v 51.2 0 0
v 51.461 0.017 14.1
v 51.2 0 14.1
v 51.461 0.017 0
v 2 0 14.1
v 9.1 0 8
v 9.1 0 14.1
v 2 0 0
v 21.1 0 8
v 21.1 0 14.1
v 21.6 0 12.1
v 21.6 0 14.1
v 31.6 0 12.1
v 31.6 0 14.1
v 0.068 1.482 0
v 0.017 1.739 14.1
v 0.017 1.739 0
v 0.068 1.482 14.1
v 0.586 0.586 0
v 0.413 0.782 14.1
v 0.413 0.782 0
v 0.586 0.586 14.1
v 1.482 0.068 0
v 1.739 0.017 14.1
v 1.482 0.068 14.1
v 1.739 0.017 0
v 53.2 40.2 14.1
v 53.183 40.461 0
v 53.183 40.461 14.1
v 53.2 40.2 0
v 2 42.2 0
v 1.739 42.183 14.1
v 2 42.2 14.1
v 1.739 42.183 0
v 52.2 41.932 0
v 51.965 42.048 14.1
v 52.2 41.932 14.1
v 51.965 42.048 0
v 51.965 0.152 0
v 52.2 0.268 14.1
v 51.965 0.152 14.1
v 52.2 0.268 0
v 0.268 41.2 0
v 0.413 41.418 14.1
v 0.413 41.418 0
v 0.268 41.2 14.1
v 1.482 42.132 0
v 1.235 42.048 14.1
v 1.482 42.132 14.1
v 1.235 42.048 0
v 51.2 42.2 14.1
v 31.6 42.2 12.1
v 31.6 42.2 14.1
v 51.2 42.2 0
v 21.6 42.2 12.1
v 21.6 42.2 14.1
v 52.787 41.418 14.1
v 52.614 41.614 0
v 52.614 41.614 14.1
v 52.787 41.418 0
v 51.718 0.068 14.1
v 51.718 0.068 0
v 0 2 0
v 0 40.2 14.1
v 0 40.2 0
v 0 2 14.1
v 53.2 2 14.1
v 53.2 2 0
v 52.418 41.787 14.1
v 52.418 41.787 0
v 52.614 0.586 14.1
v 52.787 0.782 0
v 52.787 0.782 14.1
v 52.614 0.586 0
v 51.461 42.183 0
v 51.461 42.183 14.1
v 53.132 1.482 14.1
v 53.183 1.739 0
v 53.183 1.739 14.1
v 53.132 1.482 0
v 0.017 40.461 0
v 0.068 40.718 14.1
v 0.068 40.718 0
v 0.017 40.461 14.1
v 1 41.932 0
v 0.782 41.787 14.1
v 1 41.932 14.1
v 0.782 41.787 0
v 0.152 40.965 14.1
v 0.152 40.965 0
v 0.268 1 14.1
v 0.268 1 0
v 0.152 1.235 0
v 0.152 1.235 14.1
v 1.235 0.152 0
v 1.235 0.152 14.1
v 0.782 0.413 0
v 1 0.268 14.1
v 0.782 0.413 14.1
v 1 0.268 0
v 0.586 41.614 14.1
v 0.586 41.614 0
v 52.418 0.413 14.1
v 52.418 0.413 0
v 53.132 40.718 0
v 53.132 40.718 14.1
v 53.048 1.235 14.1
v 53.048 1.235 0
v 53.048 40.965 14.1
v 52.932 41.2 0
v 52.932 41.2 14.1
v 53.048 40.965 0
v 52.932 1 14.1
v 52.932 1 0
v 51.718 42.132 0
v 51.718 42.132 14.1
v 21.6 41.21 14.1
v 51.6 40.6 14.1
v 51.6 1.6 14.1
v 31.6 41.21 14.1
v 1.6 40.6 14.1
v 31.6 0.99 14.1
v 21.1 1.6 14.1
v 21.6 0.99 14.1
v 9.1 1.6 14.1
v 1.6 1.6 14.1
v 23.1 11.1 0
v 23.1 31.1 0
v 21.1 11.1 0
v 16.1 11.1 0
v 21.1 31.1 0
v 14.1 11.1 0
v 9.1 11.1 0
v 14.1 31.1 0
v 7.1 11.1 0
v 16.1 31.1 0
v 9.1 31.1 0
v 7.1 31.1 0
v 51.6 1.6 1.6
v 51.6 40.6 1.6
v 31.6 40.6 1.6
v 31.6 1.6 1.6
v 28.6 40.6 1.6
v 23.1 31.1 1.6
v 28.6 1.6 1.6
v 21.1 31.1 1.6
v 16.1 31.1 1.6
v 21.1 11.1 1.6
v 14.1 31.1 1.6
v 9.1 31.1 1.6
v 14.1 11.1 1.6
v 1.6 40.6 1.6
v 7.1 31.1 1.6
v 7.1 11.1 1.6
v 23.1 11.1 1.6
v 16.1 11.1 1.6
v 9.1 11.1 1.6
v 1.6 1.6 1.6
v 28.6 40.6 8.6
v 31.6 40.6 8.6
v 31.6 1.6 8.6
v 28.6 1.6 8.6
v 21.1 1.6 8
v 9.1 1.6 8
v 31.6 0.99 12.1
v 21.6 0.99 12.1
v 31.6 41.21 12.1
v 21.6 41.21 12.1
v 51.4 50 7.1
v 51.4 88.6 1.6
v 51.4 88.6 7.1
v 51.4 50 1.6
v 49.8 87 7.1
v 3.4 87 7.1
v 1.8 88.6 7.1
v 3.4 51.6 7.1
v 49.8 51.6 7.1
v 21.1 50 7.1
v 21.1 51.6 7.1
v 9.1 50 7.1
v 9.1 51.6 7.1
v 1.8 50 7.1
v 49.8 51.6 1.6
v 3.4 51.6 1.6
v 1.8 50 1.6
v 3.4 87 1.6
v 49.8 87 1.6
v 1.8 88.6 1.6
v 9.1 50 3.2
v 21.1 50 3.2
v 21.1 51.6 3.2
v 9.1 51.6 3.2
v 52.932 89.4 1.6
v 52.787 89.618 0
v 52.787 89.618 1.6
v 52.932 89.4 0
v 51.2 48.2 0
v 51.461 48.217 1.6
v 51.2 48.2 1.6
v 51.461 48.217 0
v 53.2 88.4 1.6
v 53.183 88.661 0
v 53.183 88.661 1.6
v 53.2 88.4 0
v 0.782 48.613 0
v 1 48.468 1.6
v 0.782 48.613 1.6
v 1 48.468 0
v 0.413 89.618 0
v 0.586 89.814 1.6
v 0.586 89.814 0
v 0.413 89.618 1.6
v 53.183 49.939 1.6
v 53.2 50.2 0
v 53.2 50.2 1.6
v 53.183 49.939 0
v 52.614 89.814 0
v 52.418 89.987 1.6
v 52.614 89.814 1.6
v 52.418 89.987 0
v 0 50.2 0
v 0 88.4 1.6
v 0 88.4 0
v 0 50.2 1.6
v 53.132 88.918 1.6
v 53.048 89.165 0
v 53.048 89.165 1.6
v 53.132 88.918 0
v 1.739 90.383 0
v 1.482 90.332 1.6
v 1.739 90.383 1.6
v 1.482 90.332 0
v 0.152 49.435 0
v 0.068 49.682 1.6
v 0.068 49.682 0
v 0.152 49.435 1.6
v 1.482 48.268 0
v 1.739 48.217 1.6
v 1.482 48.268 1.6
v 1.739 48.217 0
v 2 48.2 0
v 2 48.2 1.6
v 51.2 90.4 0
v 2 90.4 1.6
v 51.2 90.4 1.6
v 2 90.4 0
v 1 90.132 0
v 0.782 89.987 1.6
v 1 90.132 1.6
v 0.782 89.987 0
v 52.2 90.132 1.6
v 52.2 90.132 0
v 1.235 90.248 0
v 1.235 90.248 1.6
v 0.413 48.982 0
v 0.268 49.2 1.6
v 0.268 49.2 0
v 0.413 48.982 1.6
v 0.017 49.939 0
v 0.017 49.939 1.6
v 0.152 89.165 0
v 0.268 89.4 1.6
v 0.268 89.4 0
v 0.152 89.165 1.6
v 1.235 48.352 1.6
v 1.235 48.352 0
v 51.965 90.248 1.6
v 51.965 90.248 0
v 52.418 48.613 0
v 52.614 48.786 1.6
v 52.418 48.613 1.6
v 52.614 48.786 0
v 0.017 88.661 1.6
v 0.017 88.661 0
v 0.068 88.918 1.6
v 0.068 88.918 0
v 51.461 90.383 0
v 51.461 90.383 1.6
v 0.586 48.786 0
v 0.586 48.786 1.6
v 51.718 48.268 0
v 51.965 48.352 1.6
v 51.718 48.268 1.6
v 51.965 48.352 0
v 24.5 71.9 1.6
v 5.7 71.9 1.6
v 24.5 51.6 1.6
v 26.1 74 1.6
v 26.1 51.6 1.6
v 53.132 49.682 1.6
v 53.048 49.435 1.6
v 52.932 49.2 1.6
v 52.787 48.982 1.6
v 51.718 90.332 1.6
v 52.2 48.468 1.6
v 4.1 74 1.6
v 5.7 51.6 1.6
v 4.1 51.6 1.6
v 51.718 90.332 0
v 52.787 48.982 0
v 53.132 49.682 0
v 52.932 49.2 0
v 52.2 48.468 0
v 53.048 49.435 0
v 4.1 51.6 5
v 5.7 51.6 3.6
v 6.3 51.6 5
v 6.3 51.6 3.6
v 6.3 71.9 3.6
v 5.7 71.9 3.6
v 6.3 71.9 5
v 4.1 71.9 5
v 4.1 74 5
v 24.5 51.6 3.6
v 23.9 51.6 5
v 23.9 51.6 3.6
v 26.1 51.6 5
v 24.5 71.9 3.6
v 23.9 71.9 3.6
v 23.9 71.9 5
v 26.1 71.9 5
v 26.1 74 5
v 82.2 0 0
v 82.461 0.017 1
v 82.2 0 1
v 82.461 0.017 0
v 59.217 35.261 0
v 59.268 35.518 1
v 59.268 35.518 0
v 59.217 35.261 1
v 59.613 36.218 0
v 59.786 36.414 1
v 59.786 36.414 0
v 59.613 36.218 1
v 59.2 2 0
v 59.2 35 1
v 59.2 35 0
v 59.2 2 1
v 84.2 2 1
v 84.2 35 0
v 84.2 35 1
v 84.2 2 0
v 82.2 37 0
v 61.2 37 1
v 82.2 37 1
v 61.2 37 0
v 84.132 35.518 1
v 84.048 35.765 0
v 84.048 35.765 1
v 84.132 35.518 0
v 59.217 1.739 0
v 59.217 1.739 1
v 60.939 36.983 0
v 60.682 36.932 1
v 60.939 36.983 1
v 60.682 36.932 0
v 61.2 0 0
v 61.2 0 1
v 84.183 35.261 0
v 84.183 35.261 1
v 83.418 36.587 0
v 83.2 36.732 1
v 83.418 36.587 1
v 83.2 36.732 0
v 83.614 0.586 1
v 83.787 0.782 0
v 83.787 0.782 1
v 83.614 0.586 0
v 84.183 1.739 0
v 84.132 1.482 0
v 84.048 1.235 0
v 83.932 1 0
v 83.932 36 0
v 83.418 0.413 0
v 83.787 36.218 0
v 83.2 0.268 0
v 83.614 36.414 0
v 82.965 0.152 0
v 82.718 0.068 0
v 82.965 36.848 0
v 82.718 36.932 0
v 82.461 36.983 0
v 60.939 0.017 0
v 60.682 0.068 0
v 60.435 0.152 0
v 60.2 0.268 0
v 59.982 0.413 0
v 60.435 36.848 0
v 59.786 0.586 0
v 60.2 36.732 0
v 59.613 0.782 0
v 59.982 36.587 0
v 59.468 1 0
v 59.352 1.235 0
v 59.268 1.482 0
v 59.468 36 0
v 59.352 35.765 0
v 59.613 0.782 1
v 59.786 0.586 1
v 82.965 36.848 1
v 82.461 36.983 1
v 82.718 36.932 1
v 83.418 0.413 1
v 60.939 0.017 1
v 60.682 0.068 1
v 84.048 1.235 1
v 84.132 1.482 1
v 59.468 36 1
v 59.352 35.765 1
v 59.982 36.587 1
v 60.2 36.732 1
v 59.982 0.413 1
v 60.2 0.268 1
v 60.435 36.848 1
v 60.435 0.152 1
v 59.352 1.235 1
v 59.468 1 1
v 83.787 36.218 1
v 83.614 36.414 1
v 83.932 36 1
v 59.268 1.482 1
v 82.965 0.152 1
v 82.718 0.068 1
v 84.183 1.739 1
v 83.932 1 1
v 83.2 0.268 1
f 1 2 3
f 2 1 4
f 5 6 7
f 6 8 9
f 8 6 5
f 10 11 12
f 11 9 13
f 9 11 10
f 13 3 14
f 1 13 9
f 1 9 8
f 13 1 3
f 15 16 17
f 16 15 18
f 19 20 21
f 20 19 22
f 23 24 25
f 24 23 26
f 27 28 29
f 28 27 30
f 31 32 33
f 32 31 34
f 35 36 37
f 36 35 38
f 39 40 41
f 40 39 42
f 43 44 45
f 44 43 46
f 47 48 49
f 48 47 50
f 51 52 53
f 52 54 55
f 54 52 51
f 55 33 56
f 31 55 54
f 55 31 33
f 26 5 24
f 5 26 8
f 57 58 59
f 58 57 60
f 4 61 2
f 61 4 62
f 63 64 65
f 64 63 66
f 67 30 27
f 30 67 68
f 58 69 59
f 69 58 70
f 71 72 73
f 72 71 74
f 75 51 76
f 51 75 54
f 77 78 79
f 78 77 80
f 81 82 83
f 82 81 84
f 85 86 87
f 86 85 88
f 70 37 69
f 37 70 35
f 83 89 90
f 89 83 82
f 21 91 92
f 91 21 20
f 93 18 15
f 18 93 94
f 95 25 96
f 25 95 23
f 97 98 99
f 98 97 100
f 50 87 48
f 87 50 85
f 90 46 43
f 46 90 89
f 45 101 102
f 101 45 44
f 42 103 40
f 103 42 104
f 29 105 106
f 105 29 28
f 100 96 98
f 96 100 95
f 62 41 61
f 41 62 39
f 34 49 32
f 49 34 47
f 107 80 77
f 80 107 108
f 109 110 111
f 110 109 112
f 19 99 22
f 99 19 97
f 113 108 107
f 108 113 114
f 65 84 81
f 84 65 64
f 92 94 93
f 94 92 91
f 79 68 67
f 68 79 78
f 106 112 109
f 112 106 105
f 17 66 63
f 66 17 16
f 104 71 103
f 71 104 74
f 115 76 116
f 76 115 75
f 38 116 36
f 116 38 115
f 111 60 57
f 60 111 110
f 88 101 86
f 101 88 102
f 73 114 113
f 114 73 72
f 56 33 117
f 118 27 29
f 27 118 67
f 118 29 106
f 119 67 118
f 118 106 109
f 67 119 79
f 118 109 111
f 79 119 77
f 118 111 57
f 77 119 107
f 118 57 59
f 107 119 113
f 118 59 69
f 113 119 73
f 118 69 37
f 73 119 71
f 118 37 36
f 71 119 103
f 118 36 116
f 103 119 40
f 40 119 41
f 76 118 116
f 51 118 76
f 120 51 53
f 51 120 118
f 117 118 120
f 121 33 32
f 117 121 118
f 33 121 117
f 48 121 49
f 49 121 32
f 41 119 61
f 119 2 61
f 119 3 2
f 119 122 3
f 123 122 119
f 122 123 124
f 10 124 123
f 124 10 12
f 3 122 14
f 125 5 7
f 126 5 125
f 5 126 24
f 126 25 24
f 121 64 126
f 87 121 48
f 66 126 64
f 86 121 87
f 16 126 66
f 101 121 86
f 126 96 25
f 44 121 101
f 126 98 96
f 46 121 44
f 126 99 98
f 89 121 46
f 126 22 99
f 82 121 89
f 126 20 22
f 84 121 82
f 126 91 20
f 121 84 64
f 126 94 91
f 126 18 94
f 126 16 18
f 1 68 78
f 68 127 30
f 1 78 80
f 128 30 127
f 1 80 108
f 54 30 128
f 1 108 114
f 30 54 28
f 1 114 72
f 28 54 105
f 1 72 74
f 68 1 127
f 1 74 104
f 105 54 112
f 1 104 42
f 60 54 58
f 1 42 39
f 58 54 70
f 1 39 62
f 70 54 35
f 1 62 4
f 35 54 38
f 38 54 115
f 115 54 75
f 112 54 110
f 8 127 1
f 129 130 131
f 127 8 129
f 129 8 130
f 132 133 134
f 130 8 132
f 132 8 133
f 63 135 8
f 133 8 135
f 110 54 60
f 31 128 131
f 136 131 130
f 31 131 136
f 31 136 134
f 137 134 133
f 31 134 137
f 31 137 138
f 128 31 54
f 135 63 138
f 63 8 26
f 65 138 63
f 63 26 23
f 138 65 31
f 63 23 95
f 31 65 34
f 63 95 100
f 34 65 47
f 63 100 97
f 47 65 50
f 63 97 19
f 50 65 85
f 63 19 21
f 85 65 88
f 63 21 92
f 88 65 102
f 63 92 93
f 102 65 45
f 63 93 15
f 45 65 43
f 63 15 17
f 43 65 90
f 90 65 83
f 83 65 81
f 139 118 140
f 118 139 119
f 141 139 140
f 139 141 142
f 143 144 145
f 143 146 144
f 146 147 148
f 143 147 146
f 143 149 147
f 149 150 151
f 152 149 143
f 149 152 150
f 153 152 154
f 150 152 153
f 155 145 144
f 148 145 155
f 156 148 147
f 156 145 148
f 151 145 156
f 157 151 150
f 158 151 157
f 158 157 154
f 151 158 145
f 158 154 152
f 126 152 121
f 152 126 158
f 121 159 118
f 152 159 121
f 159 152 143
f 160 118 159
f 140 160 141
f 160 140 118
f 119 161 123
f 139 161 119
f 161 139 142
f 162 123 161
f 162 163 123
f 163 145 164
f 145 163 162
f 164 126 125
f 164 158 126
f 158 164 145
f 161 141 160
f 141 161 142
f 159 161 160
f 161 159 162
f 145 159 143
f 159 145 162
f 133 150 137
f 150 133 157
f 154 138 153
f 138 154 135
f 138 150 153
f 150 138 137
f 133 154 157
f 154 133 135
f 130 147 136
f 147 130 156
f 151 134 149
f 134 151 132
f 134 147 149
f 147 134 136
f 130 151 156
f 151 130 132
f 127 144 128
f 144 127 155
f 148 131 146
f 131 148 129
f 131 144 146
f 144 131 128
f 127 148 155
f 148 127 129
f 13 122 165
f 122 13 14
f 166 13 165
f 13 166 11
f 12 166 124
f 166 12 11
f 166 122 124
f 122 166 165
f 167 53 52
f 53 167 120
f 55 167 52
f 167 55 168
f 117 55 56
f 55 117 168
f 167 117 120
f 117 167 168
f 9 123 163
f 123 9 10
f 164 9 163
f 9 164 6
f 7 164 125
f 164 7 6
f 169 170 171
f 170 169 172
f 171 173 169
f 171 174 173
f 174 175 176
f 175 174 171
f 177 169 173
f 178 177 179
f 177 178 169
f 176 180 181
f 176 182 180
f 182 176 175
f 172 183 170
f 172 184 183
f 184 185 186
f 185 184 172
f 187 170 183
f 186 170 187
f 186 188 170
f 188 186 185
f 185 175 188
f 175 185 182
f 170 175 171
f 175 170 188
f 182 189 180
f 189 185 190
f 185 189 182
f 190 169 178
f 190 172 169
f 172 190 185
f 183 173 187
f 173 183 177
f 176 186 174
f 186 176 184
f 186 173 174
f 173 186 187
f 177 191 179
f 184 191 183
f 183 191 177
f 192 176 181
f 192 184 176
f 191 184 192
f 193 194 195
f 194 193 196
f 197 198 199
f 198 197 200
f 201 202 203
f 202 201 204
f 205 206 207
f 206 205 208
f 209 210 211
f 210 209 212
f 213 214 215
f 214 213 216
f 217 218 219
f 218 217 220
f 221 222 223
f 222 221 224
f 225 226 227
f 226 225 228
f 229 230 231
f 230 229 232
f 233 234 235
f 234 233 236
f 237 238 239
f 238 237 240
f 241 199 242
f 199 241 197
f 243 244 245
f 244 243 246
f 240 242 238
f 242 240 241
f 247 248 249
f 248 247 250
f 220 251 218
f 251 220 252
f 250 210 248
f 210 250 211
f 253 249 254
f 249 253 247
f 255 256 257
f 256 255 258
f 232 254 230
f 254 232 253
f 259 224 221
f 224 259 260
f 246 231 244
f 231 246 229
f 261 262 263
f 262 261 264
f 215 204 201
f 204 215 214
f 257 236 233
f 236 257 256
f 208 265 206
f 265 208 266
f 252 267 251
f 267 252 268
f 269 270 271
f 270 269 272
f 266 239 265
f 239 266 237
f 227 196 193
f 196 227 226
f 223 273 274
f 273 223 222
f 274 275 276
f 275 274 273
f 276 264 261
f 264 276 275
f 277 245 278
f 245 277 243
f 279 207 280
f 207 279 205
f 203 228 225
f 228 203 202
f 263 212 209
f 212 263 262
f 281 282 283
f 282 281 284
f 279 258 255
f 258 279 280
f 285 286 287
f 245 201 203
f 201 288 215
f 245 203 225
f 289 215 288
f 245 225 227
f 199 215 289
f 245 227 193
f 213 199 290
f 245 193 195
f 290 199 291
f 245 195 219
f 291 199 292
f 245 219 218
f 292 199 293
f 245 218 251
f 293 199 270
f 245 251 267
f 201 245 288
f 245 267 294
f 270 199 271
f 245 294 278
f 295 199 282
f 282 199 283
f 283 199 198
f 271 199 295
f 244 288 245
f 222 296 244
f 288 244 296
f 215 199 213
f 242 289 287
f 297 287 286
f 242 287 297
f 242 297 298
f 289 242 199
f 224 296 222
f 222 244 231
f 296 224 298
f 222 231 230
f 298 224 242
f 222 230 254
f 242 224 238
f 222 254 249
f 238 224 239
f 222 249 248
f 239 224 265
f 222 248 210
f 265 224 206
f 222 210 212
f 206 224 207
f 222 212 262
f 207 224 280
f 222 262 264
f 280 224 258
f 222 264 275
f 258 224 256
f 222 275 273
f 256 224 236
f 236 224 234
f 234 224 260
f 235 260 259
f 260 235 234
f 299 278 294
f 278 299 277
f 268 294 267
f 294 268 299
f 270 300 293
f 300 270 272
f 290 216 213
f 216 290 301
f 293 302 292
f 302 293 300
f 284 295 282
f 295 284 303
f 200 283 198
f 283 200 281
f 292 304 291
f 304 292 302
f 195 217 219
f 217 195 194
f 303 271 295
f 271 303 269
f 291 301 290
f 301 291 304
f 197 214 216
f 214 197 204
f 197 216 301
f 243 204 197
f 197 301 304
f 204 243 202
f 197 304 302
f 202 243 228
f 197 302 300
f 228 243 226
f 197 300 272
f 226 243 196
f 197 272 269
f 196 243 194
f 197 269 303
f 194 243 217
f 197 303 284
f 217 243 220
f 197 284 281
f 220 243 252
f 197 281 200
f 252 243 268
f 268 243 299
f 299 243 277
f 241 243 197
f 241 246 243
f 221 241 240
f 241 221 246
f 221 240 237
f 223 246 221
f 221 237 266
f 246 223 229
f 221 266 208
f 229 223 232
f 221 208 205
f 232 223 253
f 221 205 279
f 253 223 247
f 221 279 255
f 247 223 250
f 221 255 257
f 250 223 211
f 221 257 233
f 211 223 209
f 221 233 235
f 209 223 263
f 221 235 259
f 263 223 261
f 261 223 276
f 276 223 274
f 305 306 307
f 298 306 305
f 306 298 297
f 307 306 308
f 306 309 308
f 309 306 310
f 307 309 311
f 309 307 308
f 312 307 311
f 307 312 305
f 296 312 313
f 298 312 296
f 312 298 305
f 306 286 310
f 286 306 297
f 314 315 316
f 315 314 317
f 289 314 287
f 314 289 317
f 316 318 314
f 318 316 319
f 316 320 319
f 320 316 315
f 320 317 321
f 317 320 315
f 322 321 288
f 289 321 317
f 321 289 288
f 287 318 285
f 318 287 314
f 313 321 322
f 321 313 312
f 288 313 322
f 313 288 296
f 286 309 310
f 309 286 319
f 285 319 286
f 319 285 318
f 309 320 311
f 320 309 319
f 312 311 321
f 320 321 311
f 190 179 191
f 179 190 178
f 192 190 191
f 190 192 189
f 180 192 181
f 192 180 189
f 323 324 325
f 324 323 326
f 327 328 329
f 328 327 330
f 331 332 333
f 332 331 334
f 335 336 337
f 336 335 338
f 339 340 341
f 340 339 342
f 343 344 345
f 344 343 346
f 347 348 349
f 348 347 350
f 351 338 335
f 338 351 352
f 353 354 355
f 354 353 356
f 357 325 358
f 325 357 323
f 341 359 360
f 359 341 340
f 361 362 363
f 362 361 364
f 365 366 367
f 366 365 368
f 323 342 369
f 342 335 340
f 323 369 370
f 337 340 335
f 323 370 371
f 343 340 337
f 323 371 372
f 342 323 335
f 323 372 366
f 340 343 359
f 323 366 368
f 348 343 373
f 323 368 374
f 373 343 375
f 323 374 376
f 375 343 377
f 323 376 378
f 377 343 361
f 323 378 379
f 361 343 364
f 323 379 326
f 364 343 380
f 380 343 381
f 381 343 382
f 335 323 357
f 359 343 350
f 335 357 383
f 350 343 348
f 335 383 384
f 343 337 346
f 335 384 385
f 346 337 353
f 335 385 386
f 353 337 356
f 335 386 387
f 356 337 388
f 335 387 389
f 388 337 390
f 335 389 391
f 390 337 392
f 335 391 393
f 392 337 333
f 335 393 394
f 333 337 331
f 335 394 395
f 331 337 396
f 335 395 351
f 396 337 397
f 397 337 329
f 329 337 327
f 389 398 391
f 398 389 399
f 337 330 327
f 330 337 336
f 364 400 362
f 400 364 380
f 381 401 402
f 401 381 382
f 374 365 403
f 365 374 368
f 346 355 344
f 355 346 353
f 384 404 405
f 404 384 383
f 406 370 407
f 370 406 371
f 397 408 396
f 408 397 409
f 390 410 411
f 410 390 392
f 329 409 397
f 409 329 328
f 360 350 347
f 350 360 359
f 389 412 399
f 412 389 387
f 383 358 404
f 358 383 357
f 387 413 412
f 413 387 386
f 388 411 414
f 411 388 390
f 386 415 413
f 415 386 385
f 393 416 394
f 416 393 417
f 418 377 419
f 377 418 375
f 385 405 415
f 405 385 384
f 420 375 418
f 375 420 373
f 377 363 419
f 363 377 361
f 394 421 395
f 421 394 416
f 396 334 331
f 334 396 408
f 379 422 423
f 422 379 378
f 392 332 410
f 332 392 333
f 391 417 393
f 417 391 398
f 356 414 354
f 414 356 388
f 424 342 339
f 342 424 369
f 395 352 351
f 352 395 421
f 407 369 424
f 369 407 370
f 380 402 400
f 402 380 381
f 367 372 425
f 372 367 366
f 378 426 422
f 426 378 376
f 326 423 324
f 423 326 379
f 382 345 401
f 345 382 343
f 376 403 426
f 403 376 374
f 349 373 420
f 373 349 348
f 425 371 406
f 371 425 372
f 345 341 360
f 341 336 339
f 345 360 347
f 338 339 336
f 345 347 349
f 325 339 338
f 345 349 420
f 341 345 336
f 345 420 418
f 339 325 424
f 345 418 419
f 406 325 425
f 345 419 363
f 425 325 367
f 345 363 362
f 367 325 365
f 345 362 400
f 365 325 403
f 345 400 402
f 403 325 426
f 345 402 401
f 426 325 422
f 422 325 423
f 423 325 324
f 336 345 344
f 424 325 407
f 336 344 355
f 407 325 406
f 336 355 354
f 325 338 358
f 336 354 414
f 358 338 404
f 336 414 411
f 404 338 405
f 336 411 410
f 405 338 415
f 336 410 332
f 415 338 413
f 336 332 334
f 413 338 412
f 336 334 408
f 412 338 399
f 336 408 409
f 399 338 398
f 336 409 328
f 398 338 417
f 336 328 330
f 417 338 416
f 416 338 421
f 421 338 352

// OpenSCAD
// =====================================================================
// XIAO ESP32S3 + 602535 LiPo + 37 x 18 FPC antenna enclosure
// Layout A: battery and antenna in separate floor bays, board on the lid
// Units: mm.  OpenSCAD 2021.01 or later.
// =====================================================================

/* [Part selection] */
part = "all";   // base | lid | pad | all

/* [Battery - 602535 pouch cell] */
bat_x = 25;
bat_y = 37;
bat_z = 6;
bat_swell = 1.0;   // pouch swelling headroom - do not remove

/* [Antenna - flat FPC] */
ant_x = 18;
ant_y = 37;

/* [Board - Seeed XIAO ESP32S3] */
pcb_x = 18;
pcb_y = 20;
pcb_t = 1.2;
pcb_fit = 0.4;     // per-side slip fit
pcb_seat = 0.8;    // standoff under the PCB
usbc_h = 3.2;      // connector shell height above the PCB

/* [Case] */
wall = 1.6;
floor_t = 1.6;
lid_t = 1.6;
rib = 3.0;
clr = 1.0;
corner_r = 2.0;
skirt_h = 5.5;
skirt_w = 1.6;
skirt_gap = 0.2;

/* [Openings] */
usb_w = 12;
vent_w = 2;
vent_l = 20;
pry_w = 10;
pry_d = 1.0;

/* [Hidden] */
$fn = 48;
eps = 0.01;

// ---------- derived ----------
bat_bay_x = bat_x + 2*clr;              // 27
bat_bay_z = bat_z + bat_swell;          // 7
ant_bay_x = ant_x + 2*clr;              // 20
inner_x   = bat_bay_x + rib + ant_bay_x;        // 50
inner_y   = max(bat_y, ant_y) + 2*clr;          // 39
inner_z   = bat_bay_z + skirt_h;                // 12.5  (bay + skirt landing)
ext_x     = inner_x + 2*wall;
ext_y     = inner_y + 2*wall;
base_h    = floor_t + inner_z;                  // 14.1
total_h   = base_h + lid_t;                     // 15.7

bat_cx    = wall + bat_bay_x/2;         // shared centreline: bay, board, USB window

skirt_ox  = inner_x - 2*skirt_gap;
skirt_oy  = inner_y - 2*skirt_gap;
skirt_x0  = wall + skirt_gap;
skirt_y0  = wall + skirt_gap;
in_y0     = skirt_y0 + skirt_w;

pocket_x  = pcb_x + 2*pcb_fit;
pocket_y  = pcb_y + 2*pcb_fit;
rib_h     = pcb_seat + pcb_t + 1.4;

// USB window: must span the connector, which sits at lid-local
// z = lid_t + pcb_seat + pcb_t .. + usbc_h
usb_lid_d = skirt_h - pcb_seat - pcb_t + 0.4;   // notch up from the skirt free edge
usb_base_d = skirt_h + 0.6;                     // notch down from the base rim

// ---------- helpers ----------
module rrect(x, y, r, h) {
    linear_extrude(height = h)
        offset(r = r) offset(delta = -r)
            square([x, y]);
}

module lip_rib(len) {   // retention rib, lip overhangs toward +X
    translate([0, len, 0])
        rotate([90, 0, 0])
            linear_extrude(height = len)
                polygon(points = [[0, 0], [1.6, 0],
                                  [1.6, pcb_seat + pcb_t],
                                  [2.2, pcb_seat + pcb_t],
                                  [2.2, rib_h], [0, rib_h]]);
}

// =====================================================================
// BASE - prints floor down, no supports
// =====================================================================
module base() {
    difference() {
        union() {
            difference() {
                rrect(ext_x, ext_y, corner_r, base_h);
                translate([wall, wall, floor_t])
                    cube([inner_x, inner_y, inner_z + eps]);
            }
            // divider rib, only as tall as the battery bay so the
            // U.FL pigtail can pass freely over the top
            translate([wall + bat_bay_x, wall, floor_t])
                cube([rib, inner_y, bat_bay_z]);
        }

        // USB-C window, lower half
        translate([bat_cx - usb_w/2, -eps, base_h - usb_base_d])
            cube([usb_w, wall + 2*eps, usb_base_d + eps]);

        // battery bay floor vents
        for (i = [-1, 0, 1])
            translate([bat_cx + i*7 - vent_w/2,
                       wall + inner_y/2 - vent_l/2, -eps])
                cube([vent_w, vent_l, floor_t + 2*eps]);

        // pry notches under the lid rim
        for (yy = [-eps, ext_y - pry_d + eps])
            translate([ext_x/2 - pry_w/2, yy, base_h - 2])
                cube([pry_w, pry_d, 2 + eps]);
    }
}

// =====================================================================
// LID - modelled top face down, which is also the print orientation
// =====================================================================
module lid() {
    difference() {
        union() {
            rrect(ext_x, ext_y, corner_r, lid_t);

            translate([skirt_x0, skirt_y0, lid_t])
                difference() {
                    cube([skirt_ox, skirt_oy, skirt_h]);
                    translate([skirt_w, skirt_w, -eps])
                        cube([skirt_ox - 2*skirt_w,
                              skirt_oy - 2*skirt_w, skirt_h + 2*eps]);
                }

            // board pocket
            translate([bat_cx - pocket_x/2 - 1.6, in_y0, lid_t])
                lip_rib(pocket_y);
            translate([bat_cx + pocket_x/2 + 1.6, in_y0, lid_t])
                mirror([1, 0, 0]) lip_rib(pocket_y);
            translate([bat_cx - pocket_x/2 - 1.6,
                       in_y0 + pocket_y - 0.5, lid_t])
                cube([pocket_x + 3.2, 2.1, rib_h]);
        }

        // USB-C window, upper half
        translate([bat_cx - usb_w/2, skirt_y0 - 1,
                   lid_t + skirt_h - usb_lid_d])
            cube([usb_w, skirt_w + 2, usb_lid_d + eps]);
    }
}

// =====================================================================
// PAD - print in TPU, sits under the pouch cell
// =====================================================================
module pad() {
    rrect(bat_x, bat_y, 2, 1.0);
}

// ---------- output ----------
if (part == "base") base();
else if (part == "lid") lid();
else if (part == "pad") pad();
else {
    base();
    translate([0, ext_y + 6, 0]) lid();
    translate([ext_x + 6, 0, 0]) pad();
}
